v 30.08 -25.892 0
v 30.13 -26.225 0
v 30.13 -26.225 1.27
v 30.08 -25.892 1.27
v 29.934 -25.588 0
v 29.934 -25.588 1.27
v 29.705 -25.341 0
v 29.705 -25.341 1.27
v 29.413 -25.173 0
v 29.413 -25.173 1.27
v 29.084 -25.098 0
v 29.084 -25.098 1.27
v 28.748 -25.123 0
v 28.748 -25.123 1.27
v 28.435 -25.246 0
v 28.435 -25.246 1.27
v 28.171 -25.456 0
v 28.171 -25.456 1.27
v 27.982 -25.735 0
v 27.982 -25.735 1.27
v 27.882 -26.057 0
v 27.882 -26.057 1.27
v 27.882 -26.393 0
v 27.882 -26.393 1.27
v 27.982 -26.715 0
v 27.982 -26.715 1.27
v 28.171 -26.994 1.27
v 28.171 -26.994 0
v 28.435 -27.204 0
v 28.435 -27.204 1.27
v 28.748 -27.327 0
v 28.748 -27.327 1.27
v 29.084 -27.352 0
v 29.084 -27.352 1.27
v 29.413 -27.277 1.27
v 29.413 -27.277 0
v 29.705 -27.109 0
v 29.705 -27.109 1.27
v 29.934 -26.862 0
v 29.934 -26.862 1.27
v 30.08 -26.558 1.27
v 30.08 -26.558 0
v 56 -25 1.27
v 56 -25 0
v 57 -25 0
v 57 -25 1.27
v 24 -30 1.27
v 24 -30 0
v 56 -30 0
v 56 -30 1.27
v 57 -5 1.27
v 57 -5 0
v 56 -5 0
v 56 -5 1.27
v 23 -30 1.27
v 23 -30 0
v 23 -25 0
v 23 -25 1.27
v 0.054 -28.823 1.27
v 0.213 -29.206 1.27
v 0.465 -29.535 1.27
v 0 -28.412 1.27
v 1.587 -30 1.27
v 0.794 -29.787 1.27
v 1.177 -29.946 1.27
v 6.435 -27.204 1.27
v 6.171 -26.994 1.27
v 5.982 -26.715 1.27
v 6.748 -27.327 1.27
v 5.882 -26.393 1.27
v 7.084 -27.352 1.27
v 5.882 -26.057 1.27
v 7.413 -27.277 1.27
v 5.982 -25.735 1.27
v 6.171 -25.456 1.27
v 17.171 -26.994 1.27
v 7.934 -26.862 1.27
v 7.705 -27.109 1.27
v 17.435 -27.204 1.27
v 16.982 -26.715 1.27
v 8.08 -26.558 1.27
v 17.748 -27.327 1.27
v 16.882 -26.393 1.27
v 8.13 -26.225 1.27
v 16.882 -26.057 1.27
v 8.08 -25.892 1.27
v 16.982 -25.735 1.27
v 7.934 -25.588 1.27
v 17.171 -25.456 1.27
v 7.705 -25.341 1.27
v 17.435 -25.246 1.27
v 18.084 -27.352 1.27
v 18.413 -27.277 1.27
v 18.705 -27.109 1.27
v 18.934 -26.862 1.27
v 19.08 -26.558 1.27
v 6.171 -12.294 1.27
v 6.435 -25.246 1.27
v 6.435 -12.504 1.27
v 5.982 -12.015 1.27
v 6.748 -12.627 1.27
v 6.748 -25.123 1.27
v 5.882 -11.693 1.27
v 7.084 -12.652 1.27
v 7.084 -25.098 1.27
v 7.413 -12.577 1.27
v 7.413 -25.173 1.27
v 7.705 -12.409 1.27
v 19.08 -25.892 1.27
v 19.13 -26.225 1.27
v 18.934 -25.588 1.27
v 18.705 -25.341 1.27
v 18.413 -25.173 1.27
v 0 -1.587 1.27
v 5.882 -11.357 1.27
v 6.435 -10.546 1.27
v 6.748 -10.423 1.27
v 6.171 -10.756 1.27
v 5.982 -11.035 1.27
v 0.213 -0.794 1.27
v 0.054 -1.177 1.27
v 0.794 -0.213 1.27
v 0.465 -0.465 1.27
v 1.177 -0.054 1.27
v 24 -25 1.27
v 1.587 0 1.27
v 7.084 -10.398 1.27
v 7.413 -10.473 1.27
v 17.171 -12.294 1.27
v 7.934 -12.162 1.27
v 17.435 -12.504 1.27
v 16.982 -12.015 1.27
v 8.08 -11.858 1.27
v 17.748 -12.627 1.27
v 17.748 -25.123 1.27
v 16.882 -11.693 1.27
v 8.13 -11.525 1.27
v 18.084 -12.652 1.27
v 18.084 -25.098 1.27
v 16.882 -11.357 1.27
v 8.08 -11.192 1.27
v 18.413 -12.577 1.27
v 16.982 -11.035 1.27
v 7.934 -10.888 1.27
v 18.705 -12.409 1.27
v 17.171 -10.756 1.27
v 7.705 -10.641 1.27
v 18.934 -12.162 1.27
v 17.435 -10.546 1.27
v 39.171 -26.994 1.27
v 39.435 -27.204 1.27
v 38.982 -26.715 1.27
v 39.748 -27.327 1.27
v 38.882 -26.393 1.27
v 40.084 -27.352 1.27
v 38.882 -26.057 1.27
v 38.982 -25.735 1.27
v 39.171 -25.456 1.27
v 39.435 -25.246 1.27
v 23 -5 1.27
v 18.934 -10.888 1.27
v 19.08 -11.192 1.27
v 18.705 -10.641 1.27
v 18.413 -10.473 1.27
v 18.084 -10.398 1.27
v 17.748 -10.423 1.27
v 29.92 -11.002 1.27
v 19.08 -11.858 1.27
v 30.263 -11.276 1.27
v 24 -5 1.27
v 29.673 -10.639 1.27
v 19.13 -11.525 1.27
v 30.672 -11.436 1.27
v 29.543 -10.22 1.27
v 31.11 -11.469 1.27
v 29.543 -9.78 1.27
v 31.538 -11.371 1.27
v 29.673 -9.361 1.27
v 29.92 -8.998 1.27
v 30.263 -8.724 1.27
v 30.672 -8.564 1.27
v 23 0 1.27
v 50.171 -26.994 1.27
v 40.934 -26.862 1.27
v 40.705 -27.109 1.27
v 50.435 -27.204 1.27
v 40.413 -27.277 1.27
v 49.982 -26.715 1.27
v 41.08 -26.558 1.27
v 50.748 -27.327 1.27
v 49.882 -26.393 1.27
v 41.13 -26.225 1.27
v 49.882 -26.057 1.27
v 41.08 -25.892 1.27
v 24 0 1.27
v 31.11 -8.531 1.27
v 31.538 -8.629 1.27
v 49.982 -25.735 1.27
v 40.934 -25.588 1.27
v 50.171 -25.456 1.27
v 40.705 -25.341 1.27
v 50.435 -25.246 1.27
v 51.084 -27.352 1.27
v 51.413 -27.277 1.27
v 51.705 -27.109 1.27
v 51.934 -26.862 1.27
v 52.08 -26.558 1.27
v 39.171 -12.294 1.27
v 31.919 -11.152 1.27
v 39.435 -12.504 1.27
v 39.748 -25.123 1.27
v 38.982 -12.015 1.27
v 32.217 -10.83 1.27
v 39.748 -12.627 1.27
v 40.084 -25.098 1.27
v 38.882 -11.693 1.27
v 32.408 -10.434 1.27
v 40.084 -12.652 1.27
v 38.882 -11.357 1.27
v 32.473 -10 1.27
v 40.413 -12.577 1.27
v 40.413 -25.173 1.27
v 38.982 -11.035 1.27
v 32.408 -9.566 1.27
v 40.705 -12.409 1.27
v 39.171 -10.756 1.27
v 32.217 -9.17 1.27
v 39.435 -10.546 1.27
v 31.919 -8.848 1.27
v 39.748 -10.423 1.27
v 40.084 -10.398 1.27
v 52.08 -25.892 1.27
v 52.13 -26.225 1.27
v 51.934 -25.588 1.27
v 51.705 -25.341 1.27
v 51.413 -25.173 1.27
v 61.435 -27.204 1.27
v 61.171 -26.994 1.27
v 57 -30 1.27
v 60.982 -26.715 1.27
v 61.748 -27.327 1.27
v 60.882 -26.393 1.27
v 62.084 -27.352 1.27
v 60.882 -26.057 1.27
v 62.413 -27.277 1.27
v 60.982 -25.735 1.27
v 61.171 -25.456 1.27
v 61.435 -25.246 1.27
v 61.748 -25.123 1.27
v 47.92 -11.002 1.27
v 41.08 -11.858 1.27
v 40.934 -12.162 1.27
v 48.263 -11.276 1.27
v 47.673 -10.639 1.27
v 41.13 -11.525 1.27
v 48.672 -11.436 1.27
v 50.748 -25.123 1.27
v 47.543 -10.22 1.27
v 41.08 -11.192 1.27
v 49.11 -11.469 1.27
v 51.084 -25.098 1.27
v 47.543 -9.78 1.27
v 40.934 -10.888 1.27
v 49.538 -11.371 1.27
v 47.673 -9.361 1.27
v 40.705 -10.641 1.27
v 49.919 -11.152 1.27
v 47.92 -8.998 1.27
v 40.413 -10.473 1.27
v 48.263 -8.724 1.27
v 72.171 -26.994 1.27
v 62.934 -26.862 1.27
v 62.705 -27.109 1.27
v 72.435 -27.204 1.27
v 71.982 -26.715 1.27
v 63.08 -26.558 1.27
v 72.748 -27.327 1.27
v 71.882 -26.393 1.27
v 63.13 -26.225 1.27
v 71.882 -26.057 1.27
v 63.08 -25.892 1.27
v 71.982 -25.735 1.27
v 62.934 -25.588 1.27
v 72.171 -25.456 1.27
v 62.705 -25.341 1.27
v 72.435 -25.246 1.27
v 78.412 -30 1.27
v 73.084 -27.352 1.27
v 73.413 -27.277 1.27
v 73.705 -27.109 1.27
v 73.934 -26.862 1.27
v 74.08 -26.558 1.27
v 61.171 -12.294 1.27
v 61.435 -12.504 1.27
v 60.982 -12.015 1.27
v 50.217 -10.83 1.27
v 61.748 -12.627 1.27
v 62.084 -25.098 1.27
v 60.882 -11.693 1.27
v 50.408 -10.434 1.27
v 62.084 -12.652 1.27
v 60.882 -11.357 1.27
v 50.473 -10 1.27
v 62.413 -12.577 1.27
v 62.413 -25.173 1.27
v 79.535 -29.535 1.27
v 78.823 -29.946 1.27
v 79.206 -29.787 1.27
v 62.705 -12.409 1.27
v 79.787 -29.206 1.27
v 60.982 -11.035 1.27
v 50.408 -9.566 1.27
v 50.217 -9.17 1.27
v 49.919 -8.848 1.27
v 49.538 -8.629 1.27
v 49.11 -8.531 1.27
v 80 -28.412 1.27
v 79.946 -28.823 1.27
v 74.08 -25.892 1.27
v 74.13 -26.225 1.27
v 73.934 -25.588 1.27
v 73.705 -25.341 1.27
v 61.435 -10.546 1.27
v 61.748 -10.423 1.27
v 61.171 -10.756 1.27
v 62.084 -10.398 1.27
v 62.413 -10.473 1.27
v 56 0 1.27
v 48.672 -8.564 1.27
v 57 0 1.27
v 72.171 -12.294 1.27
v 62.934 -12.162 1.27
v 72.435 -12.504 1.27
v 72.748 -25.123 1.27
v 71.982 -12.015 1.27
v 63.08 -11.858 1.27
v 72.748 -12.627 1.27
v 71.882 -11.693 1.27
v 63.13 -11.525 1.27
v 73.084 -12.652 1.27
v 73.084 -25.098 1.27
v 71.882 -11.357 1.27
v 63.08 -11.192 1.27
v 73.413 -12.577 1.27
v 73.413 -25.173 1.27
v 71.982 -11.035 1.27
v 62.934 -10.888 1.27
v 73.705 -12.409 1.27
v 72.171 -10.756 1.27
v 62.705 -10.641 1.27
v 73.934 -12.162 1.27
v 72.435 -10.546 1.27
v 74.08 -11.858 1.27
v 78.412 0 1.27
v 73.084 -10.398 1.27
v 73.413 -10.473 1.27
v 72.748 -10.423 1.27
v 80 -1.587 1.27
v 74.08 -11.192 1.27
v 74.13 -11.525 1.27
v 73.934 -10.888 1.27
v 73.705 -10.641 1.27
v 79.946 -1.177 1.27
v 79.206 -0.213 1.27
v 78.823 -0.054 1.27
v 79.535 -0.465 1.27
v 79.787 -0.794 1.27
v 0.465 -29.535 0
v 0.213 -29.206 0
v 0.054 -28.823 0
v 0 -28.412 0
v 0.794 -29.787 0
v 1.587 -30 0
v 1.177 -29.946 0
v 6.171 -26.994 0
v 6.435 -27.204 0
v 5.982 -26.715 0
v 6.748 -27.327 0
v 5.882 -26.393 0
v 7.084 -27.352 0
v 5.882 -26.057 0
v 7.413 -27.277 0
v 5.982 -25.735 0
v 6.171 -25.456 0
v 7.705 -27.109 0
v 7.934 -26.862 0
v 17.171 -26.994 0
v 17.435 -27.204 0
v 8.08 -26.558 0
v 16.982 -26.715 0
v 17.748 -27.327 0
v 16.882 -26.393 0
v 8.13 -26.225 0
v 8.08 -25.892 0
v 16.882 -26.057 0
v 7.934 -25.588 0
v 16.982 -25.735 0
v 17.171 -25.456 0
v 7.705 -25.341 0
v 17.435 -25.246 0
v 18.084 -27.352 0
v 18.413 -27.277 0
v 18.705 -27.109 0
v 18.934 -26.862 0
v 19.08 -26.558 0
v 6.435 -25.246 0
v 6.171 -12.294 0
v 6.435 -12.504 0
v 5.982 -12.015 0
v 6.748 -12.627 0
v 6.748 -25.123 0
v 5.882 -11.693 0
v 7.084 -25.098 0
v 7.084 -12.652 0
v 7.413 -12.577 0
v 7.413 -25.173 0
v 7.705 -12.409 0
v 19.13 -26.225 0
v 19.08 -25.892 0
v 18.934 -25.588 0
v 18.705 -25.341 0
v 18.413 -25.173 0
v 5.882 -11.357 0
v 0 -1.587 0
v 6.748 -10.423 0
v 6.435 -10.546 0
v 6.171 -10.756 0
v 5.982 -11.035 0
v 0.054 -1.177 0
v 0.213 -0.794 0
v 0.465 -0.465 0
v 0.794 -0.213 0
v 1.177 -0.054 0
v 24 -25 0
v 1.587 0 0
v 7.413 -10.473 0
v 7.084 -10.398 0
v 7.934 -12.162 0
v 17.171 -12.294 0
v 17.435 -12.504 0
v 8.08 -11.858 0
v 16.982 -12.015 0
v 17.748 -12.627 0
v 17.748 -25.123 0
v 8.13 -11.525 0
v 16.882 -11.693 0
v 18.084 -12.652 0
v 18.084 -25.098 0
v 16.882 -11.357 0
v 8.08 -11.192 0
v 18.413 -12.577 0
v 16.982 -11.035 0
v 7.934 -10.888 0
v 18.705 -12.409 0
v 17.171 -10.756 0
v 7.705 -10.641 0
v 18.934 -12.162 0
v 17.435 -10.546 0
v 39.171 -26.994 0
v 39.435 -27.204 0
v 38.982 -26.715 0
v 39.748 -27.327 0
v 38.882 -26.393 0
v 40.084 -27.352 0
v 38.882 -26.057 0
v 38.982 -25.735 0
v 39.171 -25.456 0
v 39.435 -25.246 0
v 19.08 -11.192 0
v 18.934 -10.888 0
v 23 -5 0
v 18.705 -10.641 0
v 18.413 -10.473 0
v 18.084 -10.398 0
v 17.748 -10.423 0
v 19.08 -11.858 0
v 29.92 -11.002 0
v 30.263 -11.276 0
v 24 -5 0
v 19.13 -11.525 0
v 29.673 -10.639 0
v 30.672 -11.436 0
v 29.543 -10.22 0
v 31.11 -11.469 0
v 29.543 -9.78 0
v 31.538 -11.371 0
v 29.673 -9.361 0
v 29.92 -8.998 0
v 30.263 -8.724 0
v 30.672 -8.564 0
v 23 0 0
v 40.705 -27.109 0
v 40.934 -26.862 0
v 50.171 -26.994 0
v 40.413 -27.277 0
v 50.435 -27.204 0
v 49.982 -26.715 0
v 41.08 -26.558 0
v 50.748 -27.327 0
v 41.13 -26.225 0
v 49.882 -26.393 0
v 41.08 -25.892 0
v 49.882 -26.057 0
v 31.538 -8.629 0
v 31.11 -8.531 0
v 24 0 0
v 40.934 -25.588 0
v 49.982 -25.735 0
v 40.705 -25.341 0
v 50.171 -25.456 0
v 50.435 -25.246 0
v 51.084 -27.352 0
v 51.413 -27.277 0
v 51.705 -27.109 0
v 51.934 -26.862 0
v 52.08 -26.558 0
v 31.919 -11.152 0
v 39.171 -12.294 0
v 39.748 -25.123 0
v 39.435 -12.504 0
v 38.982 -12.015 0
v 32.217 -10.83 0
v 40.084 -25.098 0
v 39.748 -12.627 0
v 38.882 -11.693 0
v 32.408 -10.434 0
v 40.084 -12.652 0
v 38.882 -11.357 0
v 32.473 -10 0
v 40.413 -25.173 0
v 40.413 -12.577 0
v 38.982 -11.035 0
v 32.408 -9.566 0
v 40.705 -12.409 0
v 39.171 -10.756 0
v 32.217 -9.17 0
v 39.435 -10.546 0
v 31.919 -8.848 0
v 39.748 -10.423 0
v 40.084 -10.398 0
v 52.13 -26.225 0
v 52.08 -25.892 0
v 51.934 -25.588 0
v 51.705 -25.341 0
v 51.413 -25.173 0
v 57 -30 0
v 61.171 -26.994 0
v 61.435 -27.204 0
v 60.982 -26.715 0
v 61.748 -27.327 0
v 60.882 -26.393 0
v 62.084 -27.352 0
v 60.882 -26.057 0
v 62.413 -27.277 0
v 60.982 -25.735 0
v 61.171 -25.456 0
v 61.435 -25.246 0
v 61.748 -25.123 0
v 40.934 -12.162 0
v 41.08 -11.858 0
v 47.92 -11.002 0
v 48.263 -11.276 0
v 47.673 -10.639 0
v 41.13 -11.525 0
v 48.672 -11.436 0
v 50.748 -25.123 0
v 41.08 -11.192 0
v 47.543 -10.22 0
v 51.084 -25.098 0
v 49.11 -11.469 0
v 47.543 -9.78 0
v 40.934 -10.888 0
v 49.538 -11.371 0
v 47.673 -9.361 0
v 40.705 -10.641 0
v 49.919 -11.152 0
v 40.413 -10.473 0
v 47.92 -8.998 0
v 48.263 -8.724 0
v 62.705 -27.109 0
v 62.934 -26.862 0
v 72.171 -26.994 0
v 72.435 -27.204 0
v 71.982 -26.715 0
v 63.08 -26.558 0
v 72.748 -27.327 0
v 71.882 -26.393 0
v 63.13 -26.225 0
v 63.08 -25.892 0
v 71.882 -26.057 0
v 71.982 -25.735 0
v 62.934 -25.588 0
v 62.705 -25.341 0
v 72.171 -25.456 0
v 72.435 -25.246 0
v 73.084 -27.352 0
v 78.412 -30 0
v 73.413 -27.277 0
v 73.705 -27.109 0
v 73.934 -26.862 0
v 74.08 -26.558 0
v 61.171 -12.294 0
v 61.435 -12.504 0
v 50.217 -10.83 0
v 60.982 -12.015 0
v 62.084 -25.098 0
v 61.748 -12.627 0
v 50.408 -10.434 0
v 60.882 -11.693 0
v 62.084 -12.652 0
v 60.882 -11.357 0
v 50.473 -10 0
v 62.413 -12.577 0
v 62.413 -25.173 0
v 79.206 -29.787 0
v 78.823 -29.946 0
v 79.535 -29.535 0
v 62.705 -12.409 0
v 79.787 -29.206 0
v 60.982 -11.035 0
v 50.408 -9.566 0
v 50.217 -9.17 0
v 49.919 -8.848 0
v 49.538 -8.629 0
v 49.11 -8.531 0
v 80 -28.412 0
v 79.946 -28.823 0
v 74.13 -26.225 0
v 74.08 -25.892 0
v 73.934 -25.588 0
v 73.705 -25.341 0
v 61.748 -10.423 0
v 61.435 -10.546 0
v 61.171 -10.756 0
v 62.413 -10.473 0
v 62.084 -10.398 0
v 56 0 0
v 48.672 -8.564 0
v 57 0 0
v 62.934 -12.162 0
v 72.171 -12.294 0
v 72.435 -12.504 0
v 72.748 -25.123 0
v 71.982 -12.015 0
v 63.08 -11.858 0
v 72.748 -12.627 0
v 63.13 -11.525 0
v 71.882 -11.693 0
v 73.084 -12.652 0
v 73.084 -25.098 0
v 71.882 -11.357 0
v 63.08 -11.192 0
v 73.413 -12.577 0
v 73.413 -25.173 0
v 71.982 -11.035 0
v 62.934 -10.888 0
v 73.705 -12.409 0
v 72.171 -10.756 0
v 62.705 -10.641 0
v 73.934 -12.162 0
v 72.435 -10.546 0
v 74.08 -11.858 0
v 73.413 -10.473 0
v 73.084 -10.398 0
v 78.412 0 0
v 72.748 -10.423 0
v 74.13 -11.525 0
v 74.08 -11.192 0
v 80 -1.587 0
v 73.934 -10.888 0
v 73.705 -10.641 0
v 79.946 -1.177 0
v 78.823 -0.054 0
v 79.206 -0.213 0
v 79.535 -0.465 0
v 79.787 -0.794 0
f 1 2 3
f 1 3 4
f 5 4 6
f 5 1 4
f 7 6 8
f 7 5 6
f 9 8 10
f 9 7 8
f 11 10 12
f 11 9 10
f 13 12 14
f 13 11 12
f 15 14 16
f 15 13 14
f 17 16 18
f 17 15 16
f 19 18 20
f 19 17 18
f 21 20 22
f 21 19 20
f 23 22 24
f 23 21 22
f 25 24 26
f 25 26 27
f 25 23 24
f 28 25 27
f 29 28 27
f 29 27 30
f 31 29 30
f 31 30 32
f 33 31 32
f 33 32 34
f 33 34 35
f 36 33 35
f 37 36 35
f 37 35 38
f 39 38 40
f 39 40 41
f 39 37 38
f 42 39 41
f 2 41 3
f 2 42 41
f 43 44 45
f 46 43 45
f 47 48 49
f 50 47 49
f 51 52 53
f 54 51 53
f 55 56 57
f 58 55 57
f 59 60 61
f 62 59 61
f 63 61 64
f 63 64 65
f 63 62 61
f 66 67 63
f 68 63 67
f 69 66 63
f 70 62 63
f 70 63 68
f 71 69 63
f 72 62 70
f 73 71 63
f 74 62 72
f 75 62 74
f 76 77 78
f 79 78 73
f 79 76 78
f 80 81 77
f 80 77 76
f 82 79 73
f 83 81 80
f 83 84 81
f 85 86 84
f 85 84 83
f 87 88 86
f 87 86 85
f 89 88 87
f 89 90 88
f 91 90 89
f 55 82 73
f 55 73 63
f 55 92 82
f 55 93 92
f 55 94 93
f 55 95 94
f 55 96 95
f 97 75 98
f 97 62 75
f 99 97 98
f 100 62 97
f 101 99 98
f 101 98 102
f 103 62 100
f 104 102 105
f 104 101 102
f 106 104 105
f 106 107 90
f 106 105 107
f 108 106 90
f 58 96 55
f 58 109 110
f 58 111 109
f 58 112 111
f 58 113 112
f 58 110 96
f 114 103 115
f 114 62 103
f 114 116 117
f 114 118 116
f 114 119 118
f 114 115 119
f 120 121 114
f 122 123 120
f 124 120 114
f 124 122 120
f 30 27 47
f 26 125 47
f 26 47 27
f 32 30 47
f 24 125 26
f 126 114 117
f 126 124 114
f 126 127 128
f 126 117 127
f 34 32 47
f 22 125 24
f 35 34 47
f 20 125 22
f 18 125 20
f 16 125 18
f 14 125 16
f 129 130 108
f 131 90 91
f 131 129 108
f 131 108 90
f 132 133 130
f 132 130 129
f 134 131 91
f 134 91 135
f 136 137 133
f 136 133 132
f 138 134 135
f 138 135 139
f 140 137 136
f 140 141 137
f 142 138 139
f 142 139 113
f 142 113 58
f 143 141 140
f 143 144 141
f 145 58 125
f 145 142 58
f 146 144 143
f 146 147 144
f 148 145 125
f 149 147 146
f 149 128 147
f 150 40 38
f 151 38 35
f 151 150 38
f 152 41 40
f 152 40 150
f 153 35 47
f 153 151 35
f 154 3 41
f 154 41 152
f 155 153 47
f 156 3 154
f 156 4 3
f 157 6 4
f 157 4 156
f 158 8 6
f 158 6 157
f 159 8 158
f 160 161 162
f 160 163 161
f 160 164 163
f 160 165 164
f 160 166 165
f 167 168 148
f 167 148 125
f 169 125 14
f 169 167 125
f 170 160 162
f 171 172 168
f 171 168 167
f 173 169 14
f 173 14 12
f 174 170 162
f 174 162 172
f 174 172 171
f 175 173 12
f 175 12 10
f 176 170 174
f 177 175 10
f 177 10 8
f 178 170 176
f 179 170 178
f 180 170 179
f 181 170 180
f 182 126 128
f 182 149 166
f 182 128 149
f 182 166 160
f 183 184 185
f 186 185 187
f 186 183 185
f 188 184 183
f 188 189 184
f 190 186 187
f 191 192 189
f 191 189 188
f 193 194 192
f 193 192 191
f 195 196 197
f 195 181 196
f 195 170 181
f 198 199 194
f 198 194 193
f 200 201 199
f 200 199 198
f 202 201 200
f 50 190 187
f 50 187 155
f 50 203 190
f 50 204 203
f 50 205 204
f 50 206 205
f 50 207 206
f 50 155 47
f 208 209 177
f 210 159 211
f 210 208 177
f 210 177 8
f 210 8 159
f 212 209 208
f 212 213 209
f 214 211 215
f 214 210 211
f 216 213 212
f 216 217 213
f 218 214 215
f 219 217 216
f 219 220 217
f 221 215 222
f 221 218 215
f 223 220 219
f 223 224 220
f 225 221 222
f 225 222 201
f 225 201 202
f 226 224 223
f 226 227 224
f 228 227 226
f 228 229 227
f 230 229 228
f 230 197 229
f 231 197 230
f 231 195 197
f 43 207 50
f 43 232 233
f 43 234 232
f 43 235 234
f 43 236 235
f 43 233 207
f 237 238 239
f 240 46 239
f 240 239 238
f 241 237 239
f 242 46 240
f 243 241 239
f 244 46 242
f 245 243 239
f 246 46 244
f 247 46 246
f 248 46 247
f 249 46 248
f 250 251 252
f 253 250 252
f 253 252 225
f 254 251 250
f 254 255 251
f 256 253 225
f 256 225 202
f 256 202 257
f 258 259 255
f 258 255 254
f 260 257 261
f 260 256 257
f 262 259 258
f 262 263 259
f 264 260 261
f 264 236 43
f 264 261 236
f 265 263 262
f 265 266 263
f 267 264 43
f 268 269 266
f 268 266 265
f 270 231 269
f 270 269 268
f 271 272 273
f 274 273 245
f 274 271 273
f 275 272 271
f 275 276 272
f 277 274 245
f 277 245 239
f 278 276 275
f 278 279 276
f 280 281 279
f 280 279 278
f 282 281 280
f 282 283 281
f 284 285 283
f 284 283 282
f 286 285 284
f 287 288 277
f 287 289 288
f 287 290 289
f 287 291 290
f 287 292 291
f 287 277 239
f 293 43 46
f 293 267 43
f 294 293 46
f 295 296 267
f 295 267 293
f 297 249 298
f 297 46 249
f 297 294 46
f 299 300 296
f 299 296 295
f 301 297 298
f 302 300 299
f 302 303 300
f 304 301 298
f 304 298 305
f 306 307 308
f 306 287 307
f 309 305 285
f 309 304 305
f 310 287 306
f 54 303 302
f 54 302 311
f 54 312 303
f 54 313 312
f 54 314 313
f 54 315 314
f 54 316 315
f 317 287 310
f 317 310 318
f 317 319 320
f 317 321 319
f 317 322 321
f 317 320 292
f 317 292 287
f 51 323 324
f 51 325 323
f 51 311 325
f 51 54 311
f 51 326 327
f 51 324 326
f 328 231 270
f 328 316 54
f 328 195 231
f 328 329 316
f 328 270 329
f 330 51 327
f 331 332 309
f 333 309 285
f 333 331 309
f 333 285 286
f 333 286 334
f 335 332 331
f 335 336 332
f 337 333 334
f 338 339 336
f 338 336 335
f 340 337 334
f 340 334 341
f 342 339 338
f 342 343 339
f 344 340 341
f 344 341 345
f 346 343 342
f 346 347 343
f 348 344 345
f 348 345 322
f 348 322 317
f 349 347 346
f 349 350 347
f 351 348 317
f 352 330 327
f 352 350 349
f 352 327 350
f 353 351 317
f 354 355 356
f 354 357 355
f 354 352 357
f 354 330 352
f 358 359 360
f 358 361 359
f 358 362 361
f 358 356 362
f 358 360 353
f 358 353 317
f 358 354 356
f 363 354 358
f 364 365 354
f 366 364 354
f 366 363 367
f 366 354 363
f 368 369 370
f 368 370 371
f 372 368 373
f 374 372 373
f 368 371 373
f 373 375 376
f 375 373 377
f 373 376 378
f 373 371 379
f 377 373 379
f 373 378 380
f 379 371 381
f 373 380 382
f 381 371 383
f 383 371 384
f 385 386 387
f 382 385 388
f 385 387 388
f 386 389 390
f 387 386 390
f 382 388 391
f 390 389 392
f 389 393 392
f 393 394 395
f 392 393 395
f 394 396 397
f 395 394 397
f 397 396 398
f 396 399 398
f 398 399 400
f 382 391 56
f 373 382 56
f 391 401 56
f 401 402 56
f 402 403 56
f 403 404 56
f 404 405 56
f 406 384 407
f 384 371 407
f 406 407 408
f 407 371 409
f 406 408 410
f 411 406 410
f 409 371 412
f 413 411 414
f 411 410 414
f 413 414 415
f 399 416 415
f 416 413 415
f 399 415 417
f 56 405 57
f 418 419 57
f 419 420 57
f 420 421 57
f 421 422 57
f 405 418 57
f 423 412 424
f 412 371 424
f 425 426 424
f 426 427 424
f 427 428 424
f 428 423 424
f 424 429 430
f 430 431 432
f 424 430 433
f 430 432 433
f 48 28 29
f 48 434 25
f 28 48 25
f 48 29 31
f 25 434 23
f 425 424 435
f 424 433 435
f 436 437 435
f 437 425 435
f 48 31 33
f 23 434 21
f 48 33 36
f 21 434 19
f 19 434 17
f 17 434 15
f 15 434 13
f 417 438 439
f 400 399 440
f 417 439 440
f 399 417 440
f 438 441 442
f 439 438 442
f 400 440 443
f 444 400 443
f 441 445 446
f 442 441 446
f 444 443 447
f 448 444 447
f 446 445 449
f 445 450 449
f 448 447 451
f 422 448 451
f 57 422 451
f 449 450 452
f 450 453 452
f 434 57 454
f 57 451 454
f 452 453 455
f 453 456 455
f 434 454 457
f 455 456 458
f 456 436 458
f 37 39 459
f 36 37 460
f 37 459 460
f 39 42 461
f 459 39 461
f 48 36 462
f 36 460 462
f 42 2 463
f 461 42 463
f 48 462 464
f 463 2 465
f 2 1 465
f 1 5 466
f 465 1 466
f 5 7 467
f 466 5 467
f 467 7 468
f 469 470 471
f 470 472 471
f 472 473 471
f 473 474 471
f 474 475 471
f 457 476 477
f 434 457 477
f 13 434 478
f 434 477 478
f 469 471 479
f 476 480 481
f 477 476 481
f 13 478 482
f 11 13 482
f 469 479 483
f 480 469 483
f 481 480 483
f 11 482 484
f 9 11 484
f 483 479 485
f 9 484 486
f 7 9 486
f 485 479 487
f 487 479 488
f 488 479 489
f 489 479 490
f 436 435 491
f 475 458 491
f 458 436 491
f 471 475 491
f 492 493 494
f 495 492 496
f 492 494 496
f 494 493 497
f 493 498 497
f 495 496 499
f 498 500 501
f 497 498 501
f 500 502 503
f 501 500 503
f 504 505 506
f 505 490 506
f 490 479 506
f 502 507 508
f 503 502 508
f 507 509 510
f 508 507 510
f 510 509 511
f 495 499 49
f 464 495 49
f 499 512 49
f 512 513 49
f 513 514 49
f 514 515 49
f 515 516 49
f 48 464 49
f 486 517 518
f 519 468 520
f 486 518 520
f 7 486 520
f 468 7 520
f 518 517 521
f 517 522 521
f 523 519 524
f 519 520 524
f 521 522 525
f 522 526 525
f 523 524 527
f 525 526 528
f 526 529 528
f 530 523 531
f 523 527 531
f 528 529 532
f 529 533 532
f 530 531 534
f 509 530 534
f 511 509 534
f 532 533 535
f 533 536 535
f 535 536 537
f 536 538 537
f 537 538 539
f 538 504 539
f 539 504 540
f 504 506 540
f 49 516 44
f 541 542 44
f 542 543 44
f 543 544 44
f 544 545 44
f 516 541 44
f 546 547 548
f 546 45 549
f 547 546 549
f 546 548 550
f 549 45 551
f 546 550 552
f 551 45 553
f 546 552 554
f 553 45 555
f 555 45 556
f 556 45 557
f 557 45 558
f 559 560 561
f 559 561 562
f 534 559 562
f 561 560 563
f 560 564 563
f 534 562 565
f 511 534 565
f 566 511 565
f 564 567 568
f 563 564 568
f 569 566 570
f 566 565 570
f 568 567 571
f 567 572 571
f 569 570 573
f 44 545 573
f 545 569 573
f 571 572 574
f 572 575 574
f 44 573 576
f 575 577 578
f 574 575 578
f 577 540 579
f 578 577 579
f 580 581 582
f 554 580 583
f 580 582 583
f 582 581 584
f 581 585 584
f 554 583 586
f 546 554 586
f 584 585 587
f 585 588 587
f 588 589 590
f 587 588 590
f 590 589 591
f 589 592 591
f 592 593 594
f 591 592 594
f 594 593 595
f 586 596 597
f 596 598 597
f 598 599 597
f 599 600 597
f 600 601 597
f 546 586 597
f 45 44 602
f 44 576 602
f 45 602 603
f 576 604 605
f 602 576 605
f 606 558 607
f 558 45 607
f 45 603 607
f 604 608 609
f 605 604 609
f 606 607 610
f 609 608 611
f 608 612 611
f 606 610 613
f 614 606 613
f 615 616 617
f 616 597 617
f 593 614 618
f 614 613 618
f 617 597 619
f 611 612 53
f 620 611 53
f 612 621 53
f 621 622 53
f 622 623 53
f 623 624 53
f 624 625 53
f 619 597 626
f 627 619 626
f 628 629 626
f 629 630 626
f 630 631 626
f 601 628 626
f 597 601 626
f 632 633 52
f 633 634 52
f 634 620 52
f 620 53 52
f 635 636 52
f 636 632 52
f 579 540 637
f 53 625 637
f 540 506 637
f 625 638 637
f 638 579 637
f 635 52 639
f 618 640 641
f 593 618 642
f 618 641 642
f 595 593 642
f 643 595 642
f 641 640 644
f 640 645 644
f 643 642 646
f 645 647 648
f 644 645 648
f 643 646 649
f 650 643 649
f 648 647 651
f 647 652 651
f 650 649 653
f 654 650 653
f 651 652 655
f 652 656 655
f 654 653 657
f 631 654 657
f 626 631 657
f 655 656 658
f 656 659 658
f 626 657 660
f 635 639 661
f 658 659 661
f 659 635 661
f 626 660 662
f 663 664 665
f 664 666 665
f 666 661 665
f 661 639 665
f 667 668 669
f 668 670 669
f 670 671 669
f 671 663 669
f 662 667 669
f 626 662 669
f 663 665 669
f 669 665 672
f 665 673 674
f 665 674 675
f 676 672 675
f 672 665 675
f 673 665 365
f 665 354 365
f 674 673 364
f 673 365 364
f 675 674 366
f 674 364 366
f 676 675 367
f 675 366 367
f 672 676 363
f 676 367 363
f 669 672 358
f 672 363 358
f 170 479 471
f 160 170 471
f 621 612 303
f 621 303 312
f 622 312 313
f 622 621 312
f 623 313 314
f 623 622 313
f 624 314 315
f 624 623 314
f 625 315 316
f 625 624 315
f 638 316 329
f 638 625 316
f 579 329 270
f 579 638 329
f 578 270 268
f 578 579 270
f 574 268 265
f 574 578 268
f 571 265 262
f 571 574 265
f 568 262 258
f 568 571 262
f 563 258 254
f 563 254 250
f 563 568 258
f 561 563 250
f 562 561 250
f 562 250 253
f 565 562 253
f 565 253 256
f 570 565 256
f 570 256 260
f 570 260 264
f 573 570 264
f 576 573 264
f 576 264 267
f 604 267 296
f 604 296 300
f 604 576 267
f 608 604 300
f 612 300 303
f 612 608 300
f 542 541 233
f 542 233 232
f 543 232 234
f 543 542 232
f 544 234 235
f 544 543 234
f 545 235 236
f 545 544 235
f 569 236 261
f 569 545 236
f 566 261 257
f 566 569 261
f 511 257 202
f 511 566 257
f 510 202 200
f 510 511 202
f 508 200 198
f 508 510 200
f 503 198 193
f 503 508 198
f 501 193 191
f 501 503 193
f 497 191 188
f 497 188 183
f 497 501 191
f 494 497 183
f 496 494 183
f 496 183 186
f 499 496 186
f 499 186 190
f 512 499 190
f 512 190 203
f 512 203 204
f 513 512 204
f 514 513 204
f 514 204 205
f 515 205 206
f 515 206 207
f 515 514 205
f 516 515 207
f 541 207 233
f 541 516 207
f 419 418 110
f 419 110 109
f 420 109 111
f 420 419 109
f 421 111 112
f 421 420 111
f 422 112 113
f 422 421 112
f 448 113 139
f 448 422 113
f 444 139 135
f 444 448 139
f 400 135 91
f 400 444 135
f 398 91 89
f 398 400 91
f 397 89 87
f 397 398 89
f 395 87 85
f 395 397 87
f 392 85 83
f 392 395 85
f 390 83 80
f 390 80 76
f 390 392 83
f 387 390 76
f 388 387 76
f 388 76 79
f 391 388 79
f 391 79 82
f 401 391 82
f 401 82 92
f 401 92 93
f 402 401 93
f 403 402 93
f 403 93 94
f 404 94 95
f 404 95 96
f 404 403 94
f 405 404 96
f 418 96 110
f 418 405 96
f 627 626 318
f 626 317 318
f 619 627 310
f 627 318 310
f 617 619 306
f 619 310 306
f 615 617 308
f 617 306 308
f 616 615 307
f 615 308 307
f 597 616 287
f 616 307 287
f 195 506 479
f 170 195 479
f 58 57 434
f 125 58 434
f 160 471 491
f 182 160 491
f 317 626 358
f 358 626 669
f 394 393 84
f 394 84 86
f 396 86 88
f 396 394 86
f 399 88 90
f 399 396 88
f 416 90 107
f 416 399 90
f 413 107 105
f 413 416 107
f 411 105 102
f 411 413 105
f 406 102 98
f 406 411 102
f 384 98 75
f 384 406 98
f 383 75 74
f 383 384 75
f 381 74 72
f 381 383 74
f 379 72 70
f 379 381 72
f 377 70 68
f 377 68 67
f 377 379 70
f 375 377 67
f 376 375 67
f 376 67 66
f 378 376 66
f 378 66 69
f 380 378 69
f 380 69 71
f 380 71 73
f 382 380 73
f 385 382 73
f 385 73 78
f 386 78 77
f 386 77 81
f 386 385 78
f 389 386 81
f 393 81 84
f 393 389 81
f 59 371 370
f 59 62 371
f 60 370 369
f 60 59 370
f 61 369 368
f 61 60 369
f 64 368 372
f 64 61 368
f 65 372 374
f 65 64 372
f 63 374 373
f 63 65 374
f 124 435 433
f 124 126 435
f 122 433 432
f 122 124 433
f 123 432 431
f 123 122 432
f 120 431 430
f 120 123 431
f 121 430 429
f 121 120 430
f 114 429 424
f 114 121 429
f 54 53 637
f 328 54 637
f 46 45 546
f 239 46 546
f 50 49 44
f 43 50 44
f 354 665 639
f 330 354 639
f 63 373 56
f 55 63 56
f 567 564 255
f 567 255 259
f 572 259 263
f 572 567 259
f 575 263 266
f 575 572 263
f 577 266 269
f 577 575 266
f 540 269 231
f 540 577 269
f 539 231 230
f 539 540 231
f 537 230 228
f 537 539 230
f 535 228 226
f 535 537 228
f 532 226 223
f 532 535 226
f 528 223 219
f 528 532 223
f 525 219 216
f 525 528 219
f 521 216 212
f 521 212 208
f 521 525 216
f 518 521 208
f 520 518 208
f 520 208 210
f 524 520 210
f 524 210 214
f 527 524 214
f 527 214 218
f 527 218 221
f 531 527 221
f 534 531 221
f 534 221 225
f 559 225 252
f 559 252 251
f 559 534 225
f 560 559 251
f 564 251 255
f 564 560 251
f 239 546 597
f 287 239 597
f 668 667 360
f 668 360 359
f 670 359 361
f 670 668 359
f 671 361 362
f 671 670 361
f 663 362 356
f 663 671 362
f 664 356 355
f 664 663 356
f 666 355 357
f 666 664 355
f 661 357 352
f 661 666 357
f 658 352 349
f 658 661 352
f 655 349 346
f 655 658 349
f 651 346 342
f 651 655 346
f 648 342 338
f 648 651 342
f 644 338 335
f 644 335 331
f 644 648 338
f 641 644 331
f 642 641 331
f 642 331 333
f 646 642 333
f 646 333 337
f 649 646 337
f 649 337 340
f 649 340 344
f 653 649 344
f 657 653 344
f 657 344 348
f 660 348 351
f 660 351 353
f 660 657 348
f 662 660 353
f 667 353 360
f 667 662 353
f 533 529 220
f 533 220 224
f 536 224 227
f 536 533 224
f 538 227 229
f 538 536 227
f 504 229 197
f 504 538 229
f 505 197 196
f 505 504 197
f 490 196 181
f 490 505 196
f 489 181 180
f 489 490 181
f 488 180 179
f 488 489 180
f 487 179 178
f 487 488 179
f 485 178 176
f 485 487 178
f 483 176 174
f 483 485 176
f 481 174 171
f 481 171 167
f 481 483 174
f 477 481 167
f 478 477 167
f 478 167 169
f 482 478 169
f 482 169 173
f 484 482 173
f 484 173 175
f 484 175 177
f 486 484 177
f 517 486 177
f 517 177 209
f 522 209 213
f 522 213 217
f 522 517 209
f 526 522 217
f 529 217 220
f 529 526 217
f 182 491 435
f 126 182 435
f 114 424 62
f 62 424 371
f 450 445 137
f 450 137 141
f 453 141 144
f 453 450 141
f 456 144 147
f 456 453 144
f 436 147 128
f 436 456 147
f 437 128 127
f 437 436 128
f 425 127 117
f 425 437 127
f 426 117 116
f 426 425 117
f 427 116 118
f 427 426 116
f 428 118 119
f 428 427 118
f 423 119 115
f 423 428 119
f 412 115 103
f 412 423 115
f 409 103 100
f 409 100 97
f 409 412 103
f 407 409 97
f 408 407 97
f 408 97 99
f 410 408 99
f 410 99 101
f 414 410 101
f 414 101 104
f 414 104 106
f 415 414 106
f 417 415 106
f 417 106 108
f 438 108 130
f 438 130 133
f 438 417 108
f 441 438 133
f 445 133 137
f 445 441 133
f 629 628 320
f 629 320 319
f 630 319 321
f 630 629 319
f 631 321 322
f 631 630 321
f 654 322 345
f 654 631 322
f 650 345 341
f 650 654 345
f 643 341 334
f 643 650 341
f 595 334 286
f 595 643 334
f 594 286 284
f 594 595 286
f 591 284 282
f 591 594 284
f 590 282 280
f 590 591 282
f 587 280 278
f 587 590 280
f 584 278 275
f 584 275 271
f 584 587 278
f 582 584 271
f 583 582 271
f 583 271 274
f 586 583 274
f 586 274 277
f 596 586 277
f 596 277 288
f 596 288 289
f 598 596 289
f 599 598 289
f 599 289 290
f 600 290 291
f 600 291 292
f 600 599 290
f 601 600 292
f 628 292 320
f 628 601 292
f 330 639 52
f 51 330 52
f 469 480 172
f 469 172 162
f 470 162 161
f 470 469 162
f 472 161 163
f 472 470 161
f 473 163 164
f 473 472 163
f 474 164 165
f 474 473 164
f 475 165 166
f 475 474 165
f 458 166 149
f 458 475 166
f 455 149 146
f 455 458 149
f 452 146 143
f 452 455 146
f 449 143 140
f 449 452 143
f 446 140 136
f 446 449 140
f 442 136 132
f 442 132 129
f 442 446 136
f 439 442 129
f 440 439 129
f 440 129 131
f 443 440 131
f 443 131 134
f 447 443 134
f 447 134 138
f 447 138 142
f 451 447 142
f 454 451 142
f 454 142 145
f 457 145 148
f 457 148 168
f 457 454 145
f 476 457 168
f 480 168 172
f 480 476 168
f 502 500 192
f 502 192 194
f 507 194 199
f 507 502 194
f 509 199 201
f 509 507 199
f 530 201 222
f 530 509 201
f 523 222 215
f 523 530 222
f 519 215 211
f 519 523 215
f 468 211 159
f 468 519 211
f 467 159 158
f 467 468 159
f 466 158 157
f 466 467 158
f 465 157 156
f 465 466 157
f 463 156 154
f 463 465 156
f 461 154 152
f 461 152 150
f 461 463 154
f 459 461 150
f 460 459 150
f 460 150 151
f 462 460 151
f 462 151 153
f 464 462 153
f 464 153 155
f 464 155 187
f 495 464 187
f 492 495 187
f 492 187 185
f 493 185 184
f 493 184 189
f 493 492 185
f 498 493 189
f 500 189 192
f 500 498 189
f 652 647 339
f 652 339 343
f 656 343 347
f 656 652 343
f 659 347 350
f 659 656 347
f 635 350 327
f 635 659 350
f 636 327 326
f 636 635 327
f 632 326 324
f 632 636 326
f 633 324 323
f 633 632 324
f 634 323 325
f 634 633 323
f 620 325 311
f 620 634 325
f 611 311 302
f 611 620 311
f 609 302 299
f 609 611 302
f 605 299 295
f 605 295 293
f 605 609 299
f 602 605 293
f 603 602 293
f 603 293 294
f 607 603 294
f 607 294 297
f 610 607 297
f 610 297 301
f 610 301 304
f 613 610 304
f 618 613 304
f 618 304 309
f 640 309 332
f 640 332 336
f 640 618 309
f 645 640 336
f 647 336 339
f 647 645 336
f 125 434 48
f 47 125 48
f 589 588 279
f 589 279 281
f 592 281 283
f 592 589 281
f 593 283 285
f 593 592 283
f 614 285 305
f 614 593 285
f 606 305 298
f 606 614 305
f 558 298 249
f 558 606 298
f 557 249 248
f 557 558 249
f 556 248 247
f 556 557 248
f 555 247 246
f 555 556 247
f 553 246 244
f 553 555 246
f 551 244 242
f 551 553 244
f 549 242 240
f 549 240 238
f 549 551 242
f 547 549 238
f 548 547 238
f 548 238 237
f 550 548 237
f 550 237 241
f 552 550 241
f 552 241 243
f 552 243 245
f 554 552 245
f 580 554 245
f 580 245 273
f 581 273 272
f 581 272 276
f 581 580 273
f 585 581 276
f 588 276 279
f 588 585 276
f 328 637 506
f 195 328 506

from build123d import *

# Parameters (mm, degrees)
SKETCH1_R           = 1.1303
SKETCH1_R_2         = 1.4732
BOSS_EXTRUDE1_DEPTH = 1.27
FILLET1_R           = 1.5875


with BuildPart() as part:
    # Sketch1 → Boss-Extrude1 (new body)
    with BuildSketch(Plane.XY):
        Polygon((23, 0), (0, 0), (0, -30), (23, -30), (23, -25), (24, -25), (24, -30), (56, -30), (56, -25), (57, -25), (57, -30), (80, -30), (80, 0), (57, 0), (57, -5), (56, -5), (56, 0), (24, 0), (24, -5), (23, -5), align=None)
        with Locations((7, -26.225)):
            Circle(SKETCH1_R, mode=Mode.SUBTRACT)
        with Locations((18, -26.225)):
            Circle(SKETCH1_R, mode=Mode.SUBTRACT)
        with Locations((29, -26.225)):
            Circle(SKETCH1_R, mode=Mode.SUBTRACT)
        with Locations((40, -26.225)):
            Circle(SKETCH1_R, mode=Mode.SUBTRACT)
        with Locations((51, -26.225)):
            Circle(SKETCH1_R, mode=Mode.SUBTRACT)
        with Locations((62, -26.225)):
            Circle(SKETCH1_R, mode=Mode.SUBTRACT)
        with Locations((73, -26.225)):
            Circle(SKETCH1_R, mode=Mode.SUBTRACT)
        with Locations((7, -11.525)):
            Circle(SKETCH1_R, mode=Mode.SUBTRACT)
        with Locations((18, -11.525)):
            Circle(SKETCH1_R, mode=Mode.SUBTRACT)
        with Locations((31, -10)):
            Circle(SKETCH1_R_2, mode=Mode.SUBTRACT)
        with Locations((40, -11.525)):
            Circle(SKETCH1_R, mode=Mode.SUBTRACT)
        with Locations((49, -10)):
            Circle(SKETCH1_R_2, mode=Mode.SUBTRACT)
        with Locations((62, -11.525)):
            Circle(SKETCH1_R, mode=Mode.SUBTRACT)
        with Locations((73, -11.525)):
            Circle(SKETCH1_R, mode=Mode.SUBTRACT)
    extrude(amount=BOSS_EXTRUDE1_DEPTH)

    # Fillet1
    fillet1_edges = [part.edges().sort_by_distance(p)[0] for p in [
        (0, -30, 0.635),
        (0, 0, 0.635),
        (80, 0, 0.635),
        (80, -30, 0.635),
    ]]
    fillet(fillet1_edges, radius=FILLET1_R)


solid = part.part
